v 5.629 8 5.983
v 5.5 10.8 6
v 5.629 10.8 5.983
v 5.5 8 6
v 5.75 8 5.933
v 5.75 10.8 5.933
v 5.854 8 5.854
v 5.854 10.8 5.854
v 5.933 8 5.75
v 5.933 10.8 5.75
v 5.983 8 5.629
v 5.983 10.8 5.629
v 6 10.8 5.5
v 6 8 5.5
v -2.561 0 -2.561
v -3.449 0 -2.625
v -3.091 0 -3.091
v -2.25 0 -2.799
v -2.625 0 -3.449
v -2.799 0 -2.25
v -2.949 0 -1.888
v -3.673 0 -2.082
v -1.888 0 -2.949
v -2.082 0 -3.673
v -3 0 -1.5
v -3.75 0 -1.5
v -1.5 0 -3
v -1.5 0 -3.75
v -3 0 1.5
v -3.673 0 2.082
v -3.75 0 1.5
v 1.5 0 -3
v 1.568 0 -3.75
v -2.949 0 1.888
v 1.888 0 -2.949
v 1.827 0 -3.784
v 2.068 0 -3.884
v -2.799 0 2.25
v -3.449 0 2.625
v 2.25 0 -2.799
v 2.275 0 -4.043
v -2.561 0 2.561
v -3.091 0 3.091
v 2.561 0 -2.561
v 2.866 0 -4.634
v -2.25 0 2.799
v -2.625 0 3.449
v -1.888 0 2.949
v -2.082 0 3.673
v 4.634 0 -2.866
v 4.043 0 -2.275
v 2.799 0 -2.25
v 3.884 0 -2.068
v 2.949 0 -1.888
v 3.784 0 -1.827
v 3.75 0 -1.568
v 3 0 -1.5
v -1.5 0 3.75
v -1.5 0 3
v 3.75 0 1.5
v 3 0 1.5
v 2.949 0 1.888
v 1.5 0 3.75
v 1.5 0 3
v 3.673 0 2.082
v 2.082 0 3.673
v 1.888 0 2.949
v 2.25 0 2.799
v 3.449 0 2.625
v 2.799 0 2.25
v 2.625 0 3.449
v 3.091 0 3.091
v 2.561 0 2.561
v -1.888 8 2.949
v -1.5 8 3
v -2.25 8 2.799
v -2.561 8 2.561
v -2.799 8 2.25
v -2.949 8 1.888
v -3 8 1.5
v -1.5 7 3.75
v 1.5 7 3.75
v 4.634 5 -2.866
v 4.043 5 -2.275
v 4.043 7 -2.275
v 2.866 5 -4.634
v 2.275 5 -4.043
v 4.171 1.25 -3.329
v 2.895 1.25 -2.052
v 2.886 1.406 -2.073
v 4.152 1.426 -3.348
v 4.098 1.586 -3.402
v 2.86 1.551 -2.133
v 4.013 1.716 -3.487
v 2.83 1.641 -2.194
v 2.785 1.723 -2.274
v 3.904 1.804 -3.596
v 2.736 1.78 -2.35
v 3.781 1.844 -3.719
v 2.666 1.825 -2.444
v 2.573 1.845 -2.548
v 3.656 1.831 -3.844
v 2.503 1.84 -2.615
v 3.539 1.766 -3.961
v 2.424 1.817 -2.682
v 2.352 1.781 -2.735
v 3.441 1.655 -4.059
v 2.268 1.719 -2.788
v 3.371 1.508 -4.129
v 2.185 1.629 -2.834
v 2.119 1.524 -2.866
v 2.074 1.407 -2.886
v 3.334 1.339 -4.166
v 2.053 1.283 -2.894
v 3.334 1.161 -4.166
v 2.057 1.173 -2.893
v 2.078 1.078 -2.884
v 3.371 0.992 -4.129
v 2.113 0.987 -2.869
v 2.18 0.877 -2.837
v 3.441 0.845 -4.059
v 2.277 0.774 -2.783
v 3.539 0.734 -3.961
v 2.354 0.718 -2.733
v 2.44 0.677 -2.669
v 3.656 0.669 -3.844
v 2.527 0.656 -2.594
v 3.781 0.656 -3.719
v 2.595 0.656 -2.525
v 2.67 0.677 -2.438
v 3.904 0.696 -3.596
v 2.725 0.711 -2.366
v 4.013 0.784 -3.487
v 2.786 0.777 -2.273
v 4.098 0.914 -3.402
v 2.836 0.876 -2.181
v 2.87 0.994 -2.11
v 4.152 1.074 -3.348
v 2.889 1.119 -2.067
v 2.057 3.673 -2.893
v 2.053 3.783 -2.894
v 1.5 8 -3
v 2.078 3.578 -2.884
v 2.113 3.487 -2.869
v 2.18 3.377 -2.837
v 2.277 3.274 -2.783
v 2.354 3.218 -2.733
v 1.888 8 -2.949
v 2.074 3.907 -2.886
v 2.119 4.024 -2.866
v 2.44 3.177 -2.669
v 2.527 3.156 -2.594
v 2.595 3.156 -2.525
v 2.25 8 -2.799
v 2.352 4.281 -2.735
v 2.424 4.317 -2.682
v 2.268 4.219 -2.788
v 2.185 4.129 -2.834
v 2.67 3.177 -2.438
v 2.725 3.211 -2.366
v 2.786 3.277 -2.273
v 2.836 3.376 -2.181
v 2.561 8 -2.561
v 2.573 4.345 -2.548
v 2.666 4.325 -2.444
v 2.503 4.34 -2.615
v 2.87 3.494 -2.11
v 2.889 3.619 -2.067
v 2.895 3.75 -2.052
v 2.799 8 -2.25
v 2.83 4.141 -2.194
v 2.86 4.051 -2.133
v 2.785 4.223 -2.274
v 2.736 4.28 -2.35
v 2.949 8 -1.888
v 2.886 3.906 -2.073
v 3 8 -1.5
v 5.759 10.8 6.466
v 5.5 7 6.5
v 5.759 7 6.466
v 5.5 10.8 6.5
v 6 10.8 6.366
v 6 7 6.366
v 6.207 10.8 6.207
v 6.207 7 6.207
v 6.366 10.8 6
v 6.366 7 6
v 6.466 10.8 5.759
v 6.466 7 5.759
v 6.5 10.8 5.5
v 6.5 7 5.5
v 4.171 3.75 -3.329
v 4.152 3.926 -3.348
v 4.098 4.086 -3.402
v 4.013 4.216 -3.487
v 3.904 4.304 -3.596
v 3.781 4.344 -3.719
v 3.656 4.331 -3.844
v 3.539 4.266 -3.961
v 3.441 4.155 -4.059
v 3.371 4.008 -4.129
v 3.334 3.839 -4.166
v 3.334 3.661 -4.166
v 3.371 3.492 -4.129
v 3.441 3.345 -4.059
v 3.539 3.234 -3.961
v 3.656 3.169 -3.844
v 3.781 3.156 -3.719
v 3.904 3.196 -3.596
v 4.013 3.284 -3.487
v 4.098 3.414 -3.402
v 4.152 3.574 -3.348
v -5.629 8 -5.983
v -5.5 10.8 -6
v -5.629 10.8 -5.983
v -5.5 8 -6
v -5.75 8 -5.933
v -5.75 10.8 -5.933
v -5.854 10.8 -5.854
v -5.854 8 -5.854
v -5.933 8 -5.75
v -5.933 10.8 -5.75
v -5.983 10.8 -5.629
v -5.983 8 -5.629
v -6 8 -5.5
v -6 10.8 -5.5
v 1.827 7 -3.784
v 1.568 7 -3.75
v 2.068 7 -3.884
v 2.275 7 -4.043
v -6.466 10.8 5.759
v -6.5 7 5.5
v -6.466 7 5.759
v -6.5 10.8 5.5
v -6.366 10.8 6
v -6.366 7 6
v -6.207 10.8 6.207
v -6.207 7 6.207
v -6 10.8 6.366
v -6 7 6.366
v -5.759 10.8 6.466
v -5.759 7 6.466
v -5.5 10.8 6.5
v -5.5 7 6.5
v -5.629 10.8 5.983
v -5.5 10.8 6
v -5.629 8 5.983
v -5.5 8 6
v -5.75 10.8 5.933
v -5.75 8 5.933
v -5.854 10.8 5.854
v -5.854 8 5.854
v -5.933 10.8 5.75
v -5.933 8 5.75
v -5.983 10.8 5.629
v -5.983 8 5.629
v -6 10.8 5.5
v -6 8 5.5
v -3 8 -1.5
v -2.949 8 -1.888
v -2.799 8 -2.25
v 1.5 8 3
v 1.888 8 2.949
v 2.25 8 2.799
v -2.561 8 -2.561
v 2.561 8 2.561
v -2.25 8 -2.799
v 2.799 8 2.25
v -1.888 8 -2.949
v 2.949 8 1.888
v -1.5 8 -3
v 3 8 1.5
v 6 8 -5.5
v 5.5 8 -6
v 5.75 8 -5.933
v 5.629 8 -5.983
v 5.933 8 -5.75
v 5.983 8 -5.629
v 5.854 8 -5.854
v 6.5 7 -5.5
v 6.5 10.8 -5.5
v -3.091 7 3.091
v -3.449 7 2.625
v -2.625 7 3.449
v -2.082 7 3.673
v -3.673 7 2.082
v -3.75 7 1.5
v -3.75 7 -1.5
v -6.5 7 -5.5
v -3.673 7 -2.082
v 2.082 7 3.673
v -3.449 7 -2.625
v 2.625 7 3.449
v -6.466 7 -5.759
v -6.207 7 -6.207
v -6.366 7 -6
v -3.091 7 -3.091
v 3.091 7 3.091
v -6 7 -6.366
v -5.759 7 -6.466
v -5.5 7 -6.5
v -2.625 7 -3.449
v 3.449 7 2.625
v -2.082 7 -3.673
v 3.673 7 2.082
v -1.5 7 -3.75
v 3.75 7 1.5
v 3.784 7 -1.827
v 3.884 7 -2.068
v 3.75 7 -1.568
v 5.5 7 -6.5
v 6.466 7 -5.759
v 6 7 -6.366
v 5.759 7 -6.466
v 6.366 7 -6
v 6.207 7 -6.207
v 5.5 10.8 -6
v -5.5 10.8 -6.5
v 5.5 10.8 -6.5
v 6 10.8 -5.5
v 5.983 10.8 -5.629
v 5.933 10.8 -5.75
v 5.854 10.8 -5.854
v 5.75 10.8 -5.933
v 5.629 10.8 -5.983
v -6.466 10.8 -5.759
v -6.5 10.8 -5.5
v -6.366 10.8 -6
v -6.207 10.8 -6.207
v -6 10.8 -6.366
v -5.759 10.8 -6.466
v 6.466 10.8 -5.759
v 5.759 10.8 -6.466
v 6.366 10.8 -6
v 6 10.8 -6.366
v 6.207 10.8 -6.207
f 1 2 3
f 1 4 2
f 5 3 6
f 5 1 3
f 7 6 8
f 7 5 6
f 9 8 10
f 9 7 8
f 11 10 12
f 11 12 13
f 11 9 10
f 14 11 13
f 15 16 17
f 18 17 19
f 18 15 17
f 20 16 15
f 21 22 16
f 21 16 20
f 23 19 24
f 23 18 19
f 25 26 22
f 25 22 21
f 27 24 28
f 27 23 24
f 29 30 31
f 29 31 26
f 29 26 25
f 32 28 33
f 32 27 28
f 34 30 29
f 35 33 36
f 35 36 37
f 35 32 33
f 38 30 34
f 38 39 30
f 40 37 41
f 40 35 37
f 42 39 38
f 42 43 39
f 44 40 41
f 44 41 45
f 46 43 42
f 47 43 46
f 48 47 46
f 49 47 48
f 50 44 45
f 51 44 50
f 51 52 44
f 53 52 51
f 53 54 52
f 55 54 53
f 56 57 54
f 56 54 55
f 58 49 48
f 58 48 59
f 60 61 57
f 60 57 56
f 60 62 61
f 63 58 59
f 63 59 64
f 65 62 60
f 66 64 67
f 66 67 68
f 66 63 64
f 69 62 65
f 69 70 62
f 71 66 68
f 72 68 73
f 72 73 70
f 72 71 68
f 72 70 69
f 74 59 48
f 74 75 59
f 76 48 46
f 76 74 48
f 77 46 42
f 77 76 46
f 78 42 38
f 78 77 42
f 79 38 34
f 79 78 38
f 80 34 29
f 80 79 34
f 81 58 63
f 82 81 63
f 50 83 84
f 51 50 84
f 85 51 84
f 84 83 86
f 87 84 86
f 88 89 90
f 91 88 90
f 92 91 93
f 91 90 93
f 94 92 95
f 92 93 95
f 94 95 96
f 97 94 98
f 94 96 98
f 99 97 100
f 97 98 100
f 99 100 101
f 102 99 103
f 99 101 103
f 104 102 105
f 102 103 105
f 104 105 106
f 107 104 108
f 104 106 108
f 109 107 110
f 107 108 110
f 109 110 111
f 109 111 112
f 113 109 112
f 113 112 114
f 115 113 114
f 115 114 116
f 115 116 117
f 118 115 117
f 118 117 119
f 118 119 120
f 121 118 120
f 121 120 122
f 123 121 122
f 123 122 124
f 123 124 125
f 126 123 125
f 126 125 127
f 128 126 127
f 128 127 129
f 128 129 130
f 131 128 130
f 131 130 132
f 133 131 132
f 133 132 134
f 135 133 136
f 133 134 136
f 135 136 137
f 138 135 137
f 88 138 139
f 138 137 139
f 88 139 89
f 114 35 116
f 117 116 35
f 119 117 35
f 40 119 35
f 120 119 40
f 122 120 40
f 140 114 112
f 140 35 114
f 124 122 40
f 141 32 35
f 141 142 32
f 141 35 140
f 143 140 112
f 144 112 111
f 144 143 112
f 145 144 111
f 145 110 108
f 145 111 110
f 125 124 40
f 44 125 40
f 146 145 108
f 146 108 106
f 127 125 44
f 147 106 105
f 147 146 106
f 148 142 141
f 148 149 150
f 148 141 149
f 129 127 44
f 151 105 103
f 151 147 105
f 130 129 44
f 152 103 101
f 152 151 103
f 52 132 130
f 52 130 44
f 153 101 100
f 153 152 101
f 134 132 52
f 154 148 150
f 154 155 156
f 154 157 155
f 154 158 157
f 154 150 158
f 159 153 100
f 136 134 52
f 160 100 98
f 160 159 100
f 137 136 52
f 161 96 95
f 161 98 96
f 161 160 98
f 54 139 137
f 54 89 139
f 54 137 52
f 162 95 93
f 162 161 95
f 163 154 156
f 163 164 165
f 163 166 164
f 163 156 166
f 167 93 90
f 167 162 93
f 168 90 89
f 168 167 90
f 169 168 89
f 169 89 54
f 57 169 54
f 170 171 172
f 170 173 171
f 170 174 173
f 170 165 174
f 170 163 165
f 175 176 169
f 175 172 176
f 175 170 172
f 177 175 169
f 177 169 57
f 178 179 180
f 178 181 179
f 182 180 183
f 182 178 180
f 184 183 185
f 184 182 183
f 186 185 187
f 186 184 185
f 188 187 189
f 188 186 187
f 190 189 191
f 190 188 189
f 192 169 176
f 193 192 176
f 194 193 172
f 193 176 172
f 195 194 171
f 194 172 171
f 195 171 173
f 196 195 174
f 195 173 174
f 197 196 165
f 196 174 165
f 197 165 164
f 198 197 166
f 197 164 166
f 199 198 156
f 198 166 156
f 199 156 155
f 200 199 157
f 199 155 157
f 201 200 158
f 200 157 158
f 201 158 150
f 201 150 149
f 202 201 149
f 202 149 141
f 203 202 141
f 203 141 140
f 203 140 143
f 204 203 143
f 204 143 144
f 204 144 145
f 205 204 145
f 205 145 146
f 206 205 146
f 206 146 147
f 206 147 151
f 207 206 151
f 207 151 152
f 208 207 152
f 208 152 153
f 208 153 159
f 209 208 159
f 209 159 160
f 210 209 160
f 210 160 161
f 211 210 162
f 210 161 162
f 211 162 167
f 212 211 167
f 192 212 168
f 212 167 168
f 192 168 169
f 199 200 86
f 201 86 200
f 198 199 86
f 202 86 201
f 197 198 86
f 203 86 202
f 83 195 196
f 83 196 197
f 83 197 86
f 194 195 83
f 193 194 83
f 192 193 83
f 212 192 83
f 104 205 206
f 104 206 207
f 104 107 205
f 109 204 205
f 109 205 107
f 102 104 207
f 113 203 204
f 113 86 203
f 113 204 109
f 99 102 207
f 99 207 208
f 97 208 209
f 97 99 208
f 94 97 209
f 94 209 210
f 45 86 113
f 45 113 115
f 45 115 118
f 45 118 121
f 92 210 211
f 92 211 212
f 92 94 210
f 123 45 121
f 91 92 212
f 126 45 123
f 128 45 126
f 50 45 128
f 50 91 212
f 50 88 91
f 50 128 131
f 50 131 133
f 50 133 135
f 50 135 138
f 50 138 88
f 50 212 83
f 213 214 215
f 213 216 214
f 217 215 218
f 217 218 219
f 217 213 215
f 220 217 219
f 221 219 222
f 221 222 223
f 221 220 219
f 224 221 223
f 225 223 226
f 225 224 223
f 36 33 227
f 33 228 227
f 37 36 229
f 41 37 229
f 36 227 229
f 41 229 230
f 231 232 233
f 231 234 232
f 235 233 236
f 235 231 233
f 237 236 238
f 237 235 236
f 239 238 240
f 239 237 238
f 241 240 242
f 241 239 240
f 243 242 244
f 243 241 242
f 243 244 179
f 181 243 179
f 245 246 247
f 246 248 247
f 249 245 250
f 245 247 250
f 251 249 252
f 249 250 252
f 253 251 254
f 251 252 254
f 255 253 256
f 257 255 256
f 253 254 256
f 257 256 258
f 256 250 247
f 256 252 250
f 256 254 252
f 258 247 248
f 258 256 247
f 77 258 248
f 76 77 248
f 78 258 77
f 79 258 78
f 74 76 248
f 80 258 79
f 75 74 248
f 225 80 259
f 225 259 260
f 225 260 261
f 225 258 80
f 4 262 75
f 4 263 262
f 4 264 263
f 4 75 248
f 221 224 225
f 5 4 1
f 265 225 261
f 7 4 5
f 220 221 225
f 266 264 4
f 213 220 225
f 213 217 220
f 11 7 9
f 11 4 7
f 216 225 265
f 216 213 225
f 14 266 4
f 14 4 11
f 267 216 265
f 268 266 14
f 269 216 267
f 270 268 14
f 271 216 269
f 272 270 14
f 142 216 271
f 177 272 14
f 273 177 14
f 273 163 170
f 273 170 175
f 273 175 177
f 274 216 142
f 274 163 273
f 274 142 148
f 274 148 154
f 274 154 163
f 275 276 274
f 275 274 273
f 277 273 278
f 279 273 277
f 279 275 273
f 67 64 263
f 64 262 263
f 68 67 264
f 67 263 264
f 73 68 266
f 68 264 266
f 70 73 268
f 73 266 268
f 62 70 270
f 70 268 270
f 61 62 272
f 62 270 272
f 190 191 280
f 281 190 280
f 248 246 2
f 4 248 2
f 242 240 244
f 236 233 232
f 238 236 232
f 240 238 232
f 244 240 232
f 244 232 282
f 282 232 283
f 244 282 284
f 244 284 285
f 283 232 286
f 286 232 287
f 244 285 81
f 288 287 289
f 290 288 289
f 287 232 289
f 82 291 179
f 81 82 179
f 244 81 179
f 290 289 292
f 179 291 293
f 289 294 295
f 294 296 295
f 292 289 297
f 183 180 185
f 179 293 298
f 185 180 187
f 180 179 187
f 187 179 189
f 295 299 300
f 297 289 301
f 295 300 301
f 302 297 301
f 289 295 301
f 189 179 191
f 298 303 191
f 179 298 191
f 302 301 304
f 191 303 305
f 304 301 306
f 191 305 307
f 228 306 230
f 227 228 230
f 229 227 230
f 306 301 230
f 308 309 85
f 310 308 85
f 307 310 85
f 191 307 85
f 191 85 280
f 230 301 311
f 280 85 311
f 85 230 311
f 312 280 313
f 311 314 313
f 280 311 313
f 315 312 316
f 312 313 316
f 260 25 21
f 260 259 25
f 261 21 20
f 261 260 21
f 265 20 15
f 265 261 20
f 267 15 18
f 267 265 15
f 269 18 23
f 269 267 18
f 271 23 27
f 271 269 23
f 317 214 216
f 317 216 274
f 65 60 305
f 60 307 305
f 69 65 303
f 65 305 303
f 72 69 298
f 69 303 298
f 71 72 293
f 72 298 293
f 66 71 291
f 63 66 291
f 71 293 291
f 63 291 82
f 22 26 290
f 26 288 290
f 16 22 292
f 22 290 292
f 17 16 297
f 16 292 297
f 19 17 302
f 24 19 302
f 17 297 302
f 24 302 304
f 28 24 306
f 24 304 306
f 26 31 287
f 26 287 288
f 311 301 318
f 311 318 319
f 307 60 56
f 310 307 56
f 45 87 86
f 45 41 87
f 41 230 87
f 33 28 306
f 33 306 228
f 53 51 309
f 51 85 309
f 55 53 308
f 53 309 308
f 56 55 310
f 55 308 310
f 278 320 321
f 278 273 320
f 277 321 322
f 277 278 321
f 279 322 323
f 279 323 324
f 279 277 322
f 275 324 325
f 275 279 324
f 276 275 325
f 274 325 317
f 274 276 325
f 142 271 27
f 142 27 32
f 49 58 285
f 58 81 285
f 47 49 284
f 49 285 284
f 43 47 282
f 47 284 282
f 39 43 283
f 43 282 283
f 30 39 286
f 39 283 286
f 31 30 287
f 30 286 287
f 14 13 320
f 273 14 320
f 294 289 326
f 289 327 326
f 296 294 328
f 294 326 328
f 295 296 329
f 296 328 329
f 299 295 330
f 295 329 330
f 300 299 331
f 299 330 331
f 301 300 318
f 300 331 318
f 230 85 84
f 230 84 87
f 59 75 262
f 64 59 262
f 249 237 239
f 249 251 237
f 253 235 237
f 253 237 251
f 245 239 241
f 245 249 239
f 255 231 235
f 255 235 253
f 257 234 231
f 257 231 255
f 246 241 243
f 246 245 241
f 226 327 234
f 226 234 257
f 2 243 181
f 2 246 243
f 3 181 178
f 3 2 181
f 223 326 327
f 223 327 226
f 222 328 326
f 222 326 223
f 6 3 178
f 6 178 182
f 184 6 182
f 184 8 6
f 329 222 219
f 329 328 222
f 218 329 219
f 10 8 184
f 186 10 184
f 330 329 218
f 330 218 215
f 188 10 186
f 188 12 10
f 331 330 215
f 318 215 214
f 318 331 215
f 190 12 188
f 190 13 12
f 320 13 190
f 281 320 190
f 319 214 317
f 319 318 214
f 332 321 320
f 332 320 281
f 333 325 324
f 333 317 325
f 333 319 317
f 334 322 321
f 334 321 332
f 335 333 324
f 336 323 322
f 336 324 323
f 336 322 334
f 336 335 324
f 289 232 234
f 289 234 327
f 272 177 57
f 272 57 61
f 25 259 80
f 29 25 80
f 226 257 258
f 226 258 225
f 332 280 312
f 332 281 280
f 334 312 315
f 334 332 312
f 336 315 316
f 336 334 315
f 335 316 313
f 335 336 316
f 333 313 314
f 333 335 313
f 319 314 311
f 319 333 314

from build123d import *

# Parameters (mm, degrees)
SKETCH1_W                     = 7.5
SKETCH1_H                     = 7.5
BOSS_EXTRUDE1_DEPTH           = 7
SKETCH2_W                     = 13
SKETCH2_H                     = 13
BOSS_EXTRUDE2_DEPTH           = 3.8
SKETCH3_W                     = 6
SKETCH3_H                     = 6
CUT_EXTRUDE1_DEPTH            = 11.8
SKETCH6_W                     = 12
SKETCH6_H                     = 12
CUT_EXTRUDE3_DEPTH            = 2.8
FILLET1_R                     = 0.5
BOSS_EXTRUDE3_REACH           = 12.8
FILLET4_R                     = 1.5
FILLET2_R                     = 1
TAP_DRILL_FOR_0_80_TAP1_D     = 1.19126
TAP_DRILL_FOR_0_80_TAP1_DEPTH = 7.11
TAP_DRILL_FOR_0_80_TAP1_TIP   = 0.357890611
FILLET5_R                     = 2.25
SKETCH16_W                    = 2.5
SKETCH16_H                    = 2
CUT_EXTRUDE4_DEPTH            = 0.835786
FILLET6_R                     = 1


with BuildPart() as part:
    # Sketch1 → Boss-Extrude1 (new body)
    with BuildSketch(Plane(origin=(0, 0, 0), x_dir=(1, 0, 0), z_dir=(0, 1, 0))):
        Rectangle(SKETCH1_W, SKETCH1_H)
    extrude(amount=BOSS_EXTRUDE1_DEPTH)

    # Sketch2 → Boss-Extrude2 (add)
    with BuildSketch(Plane(origin=(0, 7, 0), x_dir=(1, 0, 0), z_dir=(0, 1, 0))):
        Rectangle(SKETCH2_W, SKETCH2_H)
    extrude(amount=BOSS_EXTRUDE2_DEPTH)

    # Sketch3 → Cut-Extrude1 (cut, through all)
    with BuildSketch(Plane.XZ):
        Rectangle(SKETCH3_W, SKETCH3_H)
    extrude(amount=-CUT_EXTRUDE1_DEPTH, mode=Mode.SUBTRACT)

    # Sketch6 → Cut-Extrude3 (cut)
    with BuildSketch(Plane(origin=(0, 10.8, 0), x_dir=(1, 0, 0), z_dir=(0, 1, 0))):
        Rectangle(SKETCH6_W, SKETCH6_H)
    extrude(amount=-CUT_EXTRUDE3_DEPTH, mode=Mode.SUBTRACT)

    # Fillet1
    fillet1_edges = [part.edges().sort_by_distance(p)[0] for p in [
        (6, 9.4, 6),
        (6, 9.4, -6),
        (-6, 9.4, -6),
        (-6, 9.4, 6),
    ]]
    fillet(fillet1_edges, radius=FILLET1_R)

    # Sketch12 → Boss-Extrude3 (add, up to next)
    with BuildSketch(Plane.XZ, mode=Mode.PRIVATE) as boss_extrude3_sk1:
        Polygon((3.75, -3.75), (4.633883476, -2.866116524), (3.75, -1.982233047), align=None)
    boss_extrude3_tool1 = extrude(boss_extrude3_sk1.sketch, amount=-BOSS_EXTRUDE3_REACH, mode=Mode.PRIVATE) - part.part
    add(boss_extrude3_tool1.solids().sort_by_distance((4.044628, 0, -2.866117))[0])
    # Sketch12 → Boss-Extrude3 (add, up to next)
    with BuildSketch(Plane.XZ, mode=Mode.PRIVATE) as boss_extrude3_sk2:
        Polygon((2.866116524, -4.633883476), (3.75, -3.75), (1.982233047, -3.75), align=None)
    boss_extrude3_tool2 = extrude(boss_extrude3_sk2.sketch, amount=-BOSS_EXTRUDE3_REACH, mode=Mode.PRIVATE) - part.part
    add(boss_extrude3_tool2.solids().sort_by_distance((2.866117, 0, -4.044628))[0])

    # Fillet4
    fillet4_edges = [part.edges().sort_by_distance(p)[0] for p in [
        (-3, 4, 3),
        (3, 4, 3),
        (-3, 4, -3),
        (3, 4, -3),
    ]]
    fillet(fillet4_edges, radius=FILLET4_R)

    # Fillet2
    fillet2_edges = [part.edges().sort_by_distance(p)[0] for p in [
        (3.75, 3.5, -1.982233047),
        (1.982233047, 3.5, -3.75),
    ]]
    fillet(fillet2_edges, radius=FILLET2_R)

    # Tap Drill for #0-80 Tap1
    with Locations(Plane(origin=(3.75, 0, -3.75), x_dir=(-0.707106781, 0, -0.707106781), z_dir=(0.707106781, 0, -0.707106781))):
        with Locations((0, 1.25), (0, 3.75)):
            Hole(TAP_DRILL_FOR_0_80_TAP1_D / 2, depth=TAP_DRILL_FOR_0_80_TAP1_DEPTH)
            with Locations((0, 0, -(TAP_DRILL_FOR_0_80_TAP1_DEPTH + TAP_DRILL_FOR_0_80_TAP1_TIP / 2))):  # 118° drill point
                Cone(0, TAP_DRILL_FOR_0_80_TAP1_D / 2, TAP_DRILL_FOR_0_80_TAP1_TIP, mode=Mode.SUBTRACT)

    # Fillet5
    fillet5_edges = [part.edges().sort_by_distance(p)[0] for p in [
        (3.75, 3.5, 3.75),
        (-3.75, 3.5, 3.75),
        (-3.75, 3.5, -3.75),
    ]]
    fillet(fillet5_edges, radius=FILLET5_R)

    # Sketch16 → Cut-Extrude4 (cut)
    with BuildSketch(Plane(origin=(3.75, 0, -3.75), x_dir=(-0.707106781, 0, -0.707106781), z_dir=(0.707106781, 0, -0.707106781))):
        with Locations((0, 6)):
            Rectangle(SKETCH16_W, SKETCH16_H)
    extrude(amount=-CUT_EXTRUDE4_DEPTH, mode=Mode.SUBTRACT)

    # Fillet6
    fillet6_edges = [part.edges().sort_by_distance(p)[0] for p in [
        (-6.5, 8.9, -6.5),
        (-6.5, 8.9, 6.5),
        (6.5, 8.9, 6.5),
        (6.5, 8.9, -6.5),
    ]]
    fillet(fillet6_edges, radius=FILLET6_R)


solid = part.part
